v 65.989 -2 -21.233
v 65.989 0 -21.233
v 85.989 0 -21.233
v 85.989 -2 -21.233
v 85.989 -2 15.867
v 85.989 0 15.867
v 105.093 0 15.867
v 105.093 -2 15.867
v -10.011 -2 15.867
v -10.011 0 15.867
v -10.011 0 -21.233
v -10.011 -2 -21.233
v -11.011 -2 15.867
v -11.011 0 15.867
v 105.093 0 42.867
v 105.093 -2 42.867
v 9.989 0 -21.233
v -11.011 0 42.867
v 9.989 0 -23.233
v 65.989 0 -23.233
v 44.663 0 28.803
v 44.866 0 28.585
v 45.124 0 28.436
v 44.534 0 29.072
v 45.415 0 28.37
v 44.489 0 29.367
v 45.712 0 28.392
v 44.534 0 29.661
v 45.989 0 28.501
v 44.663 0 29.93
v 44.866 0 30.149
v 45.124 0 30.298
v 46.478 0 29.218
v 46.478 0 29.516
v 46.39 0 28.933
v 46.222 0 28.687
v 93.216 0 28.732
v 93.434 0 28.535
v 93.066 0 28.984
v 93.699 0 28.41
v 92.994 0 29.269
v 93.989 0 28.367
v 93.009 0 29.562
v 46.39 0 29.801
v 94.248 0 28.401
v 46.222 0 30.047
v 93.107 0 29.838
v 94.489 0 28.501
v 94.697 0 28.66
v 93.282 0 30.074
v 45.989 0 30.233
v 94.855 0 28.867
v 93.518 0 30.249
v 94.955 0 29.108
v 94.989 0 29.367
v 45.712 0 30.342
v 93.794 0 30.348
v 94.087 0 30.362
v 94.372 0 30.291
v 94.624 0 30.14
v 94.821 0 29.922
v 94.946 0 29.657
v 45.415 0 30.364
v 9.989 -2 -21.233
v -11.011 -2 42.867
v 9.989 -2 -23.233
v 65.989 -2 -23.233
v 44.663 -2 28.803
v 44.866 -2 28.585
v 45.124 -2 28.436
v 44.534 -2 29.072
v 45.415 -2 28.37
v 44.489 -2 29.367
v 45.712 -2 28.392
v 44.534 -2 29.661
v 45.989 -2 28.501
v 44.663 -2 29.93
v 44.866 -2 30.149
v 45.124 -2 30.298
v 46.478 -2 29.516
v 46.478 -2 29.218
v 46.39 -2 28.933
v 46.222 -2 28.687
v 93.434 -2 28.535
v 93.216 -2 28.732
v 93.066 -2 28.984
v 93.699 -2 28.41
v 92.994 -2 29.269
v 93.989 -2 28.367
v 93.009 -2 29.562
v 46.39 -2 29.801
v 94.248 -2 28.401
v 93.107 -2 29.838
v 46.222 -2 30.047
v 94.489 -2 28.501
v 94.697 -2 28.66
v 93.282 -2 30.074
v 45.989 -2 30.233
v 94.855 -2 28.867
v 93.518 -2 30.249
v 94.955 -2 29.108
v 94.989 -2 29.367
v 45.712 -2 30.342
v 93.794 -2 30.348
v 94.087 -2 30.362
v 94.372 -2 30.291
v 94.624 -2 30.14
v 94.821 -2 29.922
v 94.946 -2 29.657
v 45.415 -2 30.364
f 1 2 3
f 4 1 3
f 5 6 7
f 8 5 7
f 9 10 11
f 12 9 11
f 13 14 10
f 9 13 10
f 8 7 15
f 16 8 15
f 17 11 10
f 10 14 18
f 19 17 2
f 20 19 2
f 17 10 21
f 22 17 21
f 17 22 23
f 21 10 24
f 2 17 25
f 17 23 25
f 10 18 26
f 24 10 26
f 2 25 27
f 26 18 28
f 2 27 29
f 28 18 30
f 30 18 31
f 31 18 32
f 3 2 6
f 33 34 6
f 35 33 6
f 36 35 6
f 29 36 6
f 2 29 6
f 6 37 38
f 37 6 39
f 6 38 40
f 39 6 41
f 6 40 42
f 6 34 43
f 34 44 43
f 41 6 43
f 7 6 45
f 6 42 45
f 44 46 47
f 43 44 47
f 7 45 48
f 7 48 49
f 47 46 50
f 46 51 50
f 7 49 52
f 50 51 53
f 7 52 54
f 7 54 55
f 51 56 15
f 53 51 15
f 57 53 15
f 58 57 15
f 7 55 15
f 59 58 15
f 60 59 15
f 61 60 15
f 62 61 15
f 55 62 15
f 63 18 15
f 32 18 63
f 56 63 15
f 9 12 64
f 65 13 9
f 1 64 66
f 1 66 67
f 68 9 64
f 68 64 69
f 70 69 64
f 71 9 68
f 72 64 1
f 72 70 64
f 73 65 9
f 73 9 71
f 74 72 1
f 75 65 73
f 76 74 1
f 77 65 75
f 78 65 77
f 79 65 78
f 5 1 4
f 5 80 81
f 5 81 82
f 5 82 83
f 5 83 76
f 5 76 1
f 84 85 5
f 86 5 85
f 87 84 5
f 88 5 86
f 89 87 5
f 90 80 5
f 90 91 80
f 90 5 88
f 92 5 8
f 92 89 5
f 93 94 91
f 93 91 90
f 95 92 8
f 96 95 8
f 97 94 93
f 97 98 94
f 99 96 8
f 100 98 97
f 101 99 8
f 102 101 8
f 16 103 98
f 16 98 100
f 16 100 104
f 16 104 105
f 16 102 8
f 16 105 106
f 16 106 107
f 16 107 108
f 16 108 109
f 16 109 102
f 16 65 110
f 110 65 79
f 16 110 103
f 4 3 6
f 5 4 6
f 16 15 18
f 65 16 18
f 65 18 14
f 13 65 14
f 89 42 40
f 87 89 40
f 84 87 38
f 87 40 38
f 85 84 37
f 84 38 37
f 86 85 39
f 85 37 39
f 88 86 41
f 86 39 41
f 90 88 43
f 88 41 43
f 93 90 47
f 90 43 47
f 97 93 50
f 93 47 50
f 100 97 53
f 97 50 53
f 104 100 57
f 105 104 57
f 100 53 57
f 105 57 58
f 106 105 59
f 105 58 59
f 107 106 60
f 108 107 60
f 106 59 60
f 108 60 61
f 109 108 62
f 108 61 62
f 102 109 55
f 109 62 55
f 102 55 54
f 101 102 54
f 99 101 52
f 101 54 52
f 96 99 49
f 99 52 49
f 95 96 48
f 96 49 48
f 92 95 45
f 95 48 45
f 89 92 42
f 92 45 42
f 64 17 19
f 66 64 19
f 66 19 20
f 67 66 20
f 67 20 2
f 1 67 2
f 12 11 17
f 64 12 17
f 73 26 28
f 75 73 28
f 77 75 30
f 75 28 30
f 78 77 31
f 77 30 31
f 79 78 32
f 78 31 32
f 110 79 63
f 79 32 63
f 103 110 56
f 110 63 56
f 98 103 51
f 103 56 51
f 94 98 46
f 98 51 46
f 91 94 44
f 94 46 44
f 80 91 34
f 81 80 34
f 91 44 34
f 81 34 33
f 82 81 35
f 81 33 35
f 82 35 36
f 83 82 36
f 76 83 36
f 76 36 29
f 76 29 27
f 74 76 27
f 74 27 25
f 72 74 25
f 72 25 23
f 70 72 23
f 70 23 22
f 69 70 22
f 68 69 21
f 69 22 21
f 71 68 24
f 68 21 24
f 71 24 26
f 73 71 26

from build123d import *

# Parameters (mm, degrees)
F0_W     = 1
F0_H     = 5
F1_DEPTH = 2
F2_DEPTH = 2


# Not quite as in the source:
# - a feature names something its author has since deleted; it is built from what else it names


with BuildPart() as f1:
    # F0 (on Front) → F1 (new body)
    with BuildSketch(Plane.XZ):
        Polygon((-11.0105917081, 20.8667229116), (-10.0105917081, 20.8667229116), (-10.0105917081, 15.8667229116), (-10.0105917081, -14.7727085277), (-10.0105917081, -21.2332770884), (9.9894082919, -21.2332770884), (9.9894082919, -23.2332770884), (37.9894082919, -23.2332770884), (65.9894082919, -23.2332770884), (65.9894082919, -21.2332770884), (85.9894082919, -21.2332770884), (85.9894082919, -14.7727085277), (85.9894082919, 15.8667229116), (98.9894082919, 15.8667229116), (103.9894082919, 15.8667229116), (105.0934082919, 15.8667229116), (105.0934082919, 42.8667229116), (103.9894082919, 42.8667229116), (98.9894082919, 42.8667229116), (93.9894082919, 42.8667229116), (37.9894082919, 42.8667229116), (-10.0105917081, 42.8667229116), (-11.0105917081, 42.8667229116), align=None)
        with BuildLine():
            ThreePointArc((46.4894082919, 29.3667229116), (45.4894082919, 28.3667229116), (44.4894082919, 29.3667229116))
            ThreePointArc((44.4894082919, 29.3667229116), (45.4894082919, 30.3667229116), (46.4894082919, 29.3667229116))
        make_face(mode=Mode.SUBTRACT)
        with BuildLine():
            ThreePointArc((93.9894082919, 28.3667229116), (93.2823015107, 30.0738296928), (94.9894082919, 29.3667229116))
            ThreePointArc((94.9894082919, 29.3667229116), (94.6965150731, 28.6596161304), (93.9894082919, 28.3667229116))
        make_face(mode=Mode.SUBTRACT)
        with Locations((-10.5105917081, 18.3667229116)):
            Rectangle(F0_W, F0_H)
    extrude(amount=F1_DEPTH)

    # F0 (on Front) → F2 (join)
    with BuildSketch(Plane.XZ):
        Polygon((-11.0105917081, 20.8667229116), (-10.0105917081, 20.8667229116), (-10.0105917081, 15.8667229116), (-10.0105917081, -14.7727085277), (-10.0105917081, -21.2332770884), (9.9894082919, -21.2332770884), (9.9894082919, -23.2332770884), (37.9894082919, -23.2332770884), (65.9894082919, -23.2332770884), (65.9894082919, -21.2332770884), (85.9894082919, -21.2332770884), (85.9894082919, -14.7727085277), (85.9894082919, 15.8667229116), (98.9894082919, 15.8667229116), (103.9894082919, 15.8667229116), (105.0934082919, 15.8667229116), (105.0934082919, 42.8667229116), (103.9894082919, 42.8667229116), (98.9894082919, 42.8667229116), (93.9894082919, 42.8667229116), (37.9894082919, 42.8667229116), (-10.0105917081, 42.8667229116), (-11.0105917081, 42.8667229116), align=None)
        with BuildLine():
            ThreePointArc((46.4894082919, 29.3667229116), (45.4894082919, 28.3667229116), (44.4894082919, 29.3667229116))
            ThreePointArc((44.4894082919, 29.3667229116), (45.4894082919, 30.3667229116), (46.4894082919, 29.3667229116))
        make_face(mode=Mode.SUBTRACT)
        with BuildLine():
            ThreePointArc((93.9894082919, 28.3667229116), (93.2823015107, 30.0738296928), (94.9894082919, 29.3667229116))
            ThreePointArc((94.9894082919, 29.3667229116), (94.6965150731, 28.6596161304), (93.9894082919, 28.3667229116))
        make_face(mode=Mode.SUBTRACT)
    extrude(amount=F2_DEPTH)


solid = f1.part
